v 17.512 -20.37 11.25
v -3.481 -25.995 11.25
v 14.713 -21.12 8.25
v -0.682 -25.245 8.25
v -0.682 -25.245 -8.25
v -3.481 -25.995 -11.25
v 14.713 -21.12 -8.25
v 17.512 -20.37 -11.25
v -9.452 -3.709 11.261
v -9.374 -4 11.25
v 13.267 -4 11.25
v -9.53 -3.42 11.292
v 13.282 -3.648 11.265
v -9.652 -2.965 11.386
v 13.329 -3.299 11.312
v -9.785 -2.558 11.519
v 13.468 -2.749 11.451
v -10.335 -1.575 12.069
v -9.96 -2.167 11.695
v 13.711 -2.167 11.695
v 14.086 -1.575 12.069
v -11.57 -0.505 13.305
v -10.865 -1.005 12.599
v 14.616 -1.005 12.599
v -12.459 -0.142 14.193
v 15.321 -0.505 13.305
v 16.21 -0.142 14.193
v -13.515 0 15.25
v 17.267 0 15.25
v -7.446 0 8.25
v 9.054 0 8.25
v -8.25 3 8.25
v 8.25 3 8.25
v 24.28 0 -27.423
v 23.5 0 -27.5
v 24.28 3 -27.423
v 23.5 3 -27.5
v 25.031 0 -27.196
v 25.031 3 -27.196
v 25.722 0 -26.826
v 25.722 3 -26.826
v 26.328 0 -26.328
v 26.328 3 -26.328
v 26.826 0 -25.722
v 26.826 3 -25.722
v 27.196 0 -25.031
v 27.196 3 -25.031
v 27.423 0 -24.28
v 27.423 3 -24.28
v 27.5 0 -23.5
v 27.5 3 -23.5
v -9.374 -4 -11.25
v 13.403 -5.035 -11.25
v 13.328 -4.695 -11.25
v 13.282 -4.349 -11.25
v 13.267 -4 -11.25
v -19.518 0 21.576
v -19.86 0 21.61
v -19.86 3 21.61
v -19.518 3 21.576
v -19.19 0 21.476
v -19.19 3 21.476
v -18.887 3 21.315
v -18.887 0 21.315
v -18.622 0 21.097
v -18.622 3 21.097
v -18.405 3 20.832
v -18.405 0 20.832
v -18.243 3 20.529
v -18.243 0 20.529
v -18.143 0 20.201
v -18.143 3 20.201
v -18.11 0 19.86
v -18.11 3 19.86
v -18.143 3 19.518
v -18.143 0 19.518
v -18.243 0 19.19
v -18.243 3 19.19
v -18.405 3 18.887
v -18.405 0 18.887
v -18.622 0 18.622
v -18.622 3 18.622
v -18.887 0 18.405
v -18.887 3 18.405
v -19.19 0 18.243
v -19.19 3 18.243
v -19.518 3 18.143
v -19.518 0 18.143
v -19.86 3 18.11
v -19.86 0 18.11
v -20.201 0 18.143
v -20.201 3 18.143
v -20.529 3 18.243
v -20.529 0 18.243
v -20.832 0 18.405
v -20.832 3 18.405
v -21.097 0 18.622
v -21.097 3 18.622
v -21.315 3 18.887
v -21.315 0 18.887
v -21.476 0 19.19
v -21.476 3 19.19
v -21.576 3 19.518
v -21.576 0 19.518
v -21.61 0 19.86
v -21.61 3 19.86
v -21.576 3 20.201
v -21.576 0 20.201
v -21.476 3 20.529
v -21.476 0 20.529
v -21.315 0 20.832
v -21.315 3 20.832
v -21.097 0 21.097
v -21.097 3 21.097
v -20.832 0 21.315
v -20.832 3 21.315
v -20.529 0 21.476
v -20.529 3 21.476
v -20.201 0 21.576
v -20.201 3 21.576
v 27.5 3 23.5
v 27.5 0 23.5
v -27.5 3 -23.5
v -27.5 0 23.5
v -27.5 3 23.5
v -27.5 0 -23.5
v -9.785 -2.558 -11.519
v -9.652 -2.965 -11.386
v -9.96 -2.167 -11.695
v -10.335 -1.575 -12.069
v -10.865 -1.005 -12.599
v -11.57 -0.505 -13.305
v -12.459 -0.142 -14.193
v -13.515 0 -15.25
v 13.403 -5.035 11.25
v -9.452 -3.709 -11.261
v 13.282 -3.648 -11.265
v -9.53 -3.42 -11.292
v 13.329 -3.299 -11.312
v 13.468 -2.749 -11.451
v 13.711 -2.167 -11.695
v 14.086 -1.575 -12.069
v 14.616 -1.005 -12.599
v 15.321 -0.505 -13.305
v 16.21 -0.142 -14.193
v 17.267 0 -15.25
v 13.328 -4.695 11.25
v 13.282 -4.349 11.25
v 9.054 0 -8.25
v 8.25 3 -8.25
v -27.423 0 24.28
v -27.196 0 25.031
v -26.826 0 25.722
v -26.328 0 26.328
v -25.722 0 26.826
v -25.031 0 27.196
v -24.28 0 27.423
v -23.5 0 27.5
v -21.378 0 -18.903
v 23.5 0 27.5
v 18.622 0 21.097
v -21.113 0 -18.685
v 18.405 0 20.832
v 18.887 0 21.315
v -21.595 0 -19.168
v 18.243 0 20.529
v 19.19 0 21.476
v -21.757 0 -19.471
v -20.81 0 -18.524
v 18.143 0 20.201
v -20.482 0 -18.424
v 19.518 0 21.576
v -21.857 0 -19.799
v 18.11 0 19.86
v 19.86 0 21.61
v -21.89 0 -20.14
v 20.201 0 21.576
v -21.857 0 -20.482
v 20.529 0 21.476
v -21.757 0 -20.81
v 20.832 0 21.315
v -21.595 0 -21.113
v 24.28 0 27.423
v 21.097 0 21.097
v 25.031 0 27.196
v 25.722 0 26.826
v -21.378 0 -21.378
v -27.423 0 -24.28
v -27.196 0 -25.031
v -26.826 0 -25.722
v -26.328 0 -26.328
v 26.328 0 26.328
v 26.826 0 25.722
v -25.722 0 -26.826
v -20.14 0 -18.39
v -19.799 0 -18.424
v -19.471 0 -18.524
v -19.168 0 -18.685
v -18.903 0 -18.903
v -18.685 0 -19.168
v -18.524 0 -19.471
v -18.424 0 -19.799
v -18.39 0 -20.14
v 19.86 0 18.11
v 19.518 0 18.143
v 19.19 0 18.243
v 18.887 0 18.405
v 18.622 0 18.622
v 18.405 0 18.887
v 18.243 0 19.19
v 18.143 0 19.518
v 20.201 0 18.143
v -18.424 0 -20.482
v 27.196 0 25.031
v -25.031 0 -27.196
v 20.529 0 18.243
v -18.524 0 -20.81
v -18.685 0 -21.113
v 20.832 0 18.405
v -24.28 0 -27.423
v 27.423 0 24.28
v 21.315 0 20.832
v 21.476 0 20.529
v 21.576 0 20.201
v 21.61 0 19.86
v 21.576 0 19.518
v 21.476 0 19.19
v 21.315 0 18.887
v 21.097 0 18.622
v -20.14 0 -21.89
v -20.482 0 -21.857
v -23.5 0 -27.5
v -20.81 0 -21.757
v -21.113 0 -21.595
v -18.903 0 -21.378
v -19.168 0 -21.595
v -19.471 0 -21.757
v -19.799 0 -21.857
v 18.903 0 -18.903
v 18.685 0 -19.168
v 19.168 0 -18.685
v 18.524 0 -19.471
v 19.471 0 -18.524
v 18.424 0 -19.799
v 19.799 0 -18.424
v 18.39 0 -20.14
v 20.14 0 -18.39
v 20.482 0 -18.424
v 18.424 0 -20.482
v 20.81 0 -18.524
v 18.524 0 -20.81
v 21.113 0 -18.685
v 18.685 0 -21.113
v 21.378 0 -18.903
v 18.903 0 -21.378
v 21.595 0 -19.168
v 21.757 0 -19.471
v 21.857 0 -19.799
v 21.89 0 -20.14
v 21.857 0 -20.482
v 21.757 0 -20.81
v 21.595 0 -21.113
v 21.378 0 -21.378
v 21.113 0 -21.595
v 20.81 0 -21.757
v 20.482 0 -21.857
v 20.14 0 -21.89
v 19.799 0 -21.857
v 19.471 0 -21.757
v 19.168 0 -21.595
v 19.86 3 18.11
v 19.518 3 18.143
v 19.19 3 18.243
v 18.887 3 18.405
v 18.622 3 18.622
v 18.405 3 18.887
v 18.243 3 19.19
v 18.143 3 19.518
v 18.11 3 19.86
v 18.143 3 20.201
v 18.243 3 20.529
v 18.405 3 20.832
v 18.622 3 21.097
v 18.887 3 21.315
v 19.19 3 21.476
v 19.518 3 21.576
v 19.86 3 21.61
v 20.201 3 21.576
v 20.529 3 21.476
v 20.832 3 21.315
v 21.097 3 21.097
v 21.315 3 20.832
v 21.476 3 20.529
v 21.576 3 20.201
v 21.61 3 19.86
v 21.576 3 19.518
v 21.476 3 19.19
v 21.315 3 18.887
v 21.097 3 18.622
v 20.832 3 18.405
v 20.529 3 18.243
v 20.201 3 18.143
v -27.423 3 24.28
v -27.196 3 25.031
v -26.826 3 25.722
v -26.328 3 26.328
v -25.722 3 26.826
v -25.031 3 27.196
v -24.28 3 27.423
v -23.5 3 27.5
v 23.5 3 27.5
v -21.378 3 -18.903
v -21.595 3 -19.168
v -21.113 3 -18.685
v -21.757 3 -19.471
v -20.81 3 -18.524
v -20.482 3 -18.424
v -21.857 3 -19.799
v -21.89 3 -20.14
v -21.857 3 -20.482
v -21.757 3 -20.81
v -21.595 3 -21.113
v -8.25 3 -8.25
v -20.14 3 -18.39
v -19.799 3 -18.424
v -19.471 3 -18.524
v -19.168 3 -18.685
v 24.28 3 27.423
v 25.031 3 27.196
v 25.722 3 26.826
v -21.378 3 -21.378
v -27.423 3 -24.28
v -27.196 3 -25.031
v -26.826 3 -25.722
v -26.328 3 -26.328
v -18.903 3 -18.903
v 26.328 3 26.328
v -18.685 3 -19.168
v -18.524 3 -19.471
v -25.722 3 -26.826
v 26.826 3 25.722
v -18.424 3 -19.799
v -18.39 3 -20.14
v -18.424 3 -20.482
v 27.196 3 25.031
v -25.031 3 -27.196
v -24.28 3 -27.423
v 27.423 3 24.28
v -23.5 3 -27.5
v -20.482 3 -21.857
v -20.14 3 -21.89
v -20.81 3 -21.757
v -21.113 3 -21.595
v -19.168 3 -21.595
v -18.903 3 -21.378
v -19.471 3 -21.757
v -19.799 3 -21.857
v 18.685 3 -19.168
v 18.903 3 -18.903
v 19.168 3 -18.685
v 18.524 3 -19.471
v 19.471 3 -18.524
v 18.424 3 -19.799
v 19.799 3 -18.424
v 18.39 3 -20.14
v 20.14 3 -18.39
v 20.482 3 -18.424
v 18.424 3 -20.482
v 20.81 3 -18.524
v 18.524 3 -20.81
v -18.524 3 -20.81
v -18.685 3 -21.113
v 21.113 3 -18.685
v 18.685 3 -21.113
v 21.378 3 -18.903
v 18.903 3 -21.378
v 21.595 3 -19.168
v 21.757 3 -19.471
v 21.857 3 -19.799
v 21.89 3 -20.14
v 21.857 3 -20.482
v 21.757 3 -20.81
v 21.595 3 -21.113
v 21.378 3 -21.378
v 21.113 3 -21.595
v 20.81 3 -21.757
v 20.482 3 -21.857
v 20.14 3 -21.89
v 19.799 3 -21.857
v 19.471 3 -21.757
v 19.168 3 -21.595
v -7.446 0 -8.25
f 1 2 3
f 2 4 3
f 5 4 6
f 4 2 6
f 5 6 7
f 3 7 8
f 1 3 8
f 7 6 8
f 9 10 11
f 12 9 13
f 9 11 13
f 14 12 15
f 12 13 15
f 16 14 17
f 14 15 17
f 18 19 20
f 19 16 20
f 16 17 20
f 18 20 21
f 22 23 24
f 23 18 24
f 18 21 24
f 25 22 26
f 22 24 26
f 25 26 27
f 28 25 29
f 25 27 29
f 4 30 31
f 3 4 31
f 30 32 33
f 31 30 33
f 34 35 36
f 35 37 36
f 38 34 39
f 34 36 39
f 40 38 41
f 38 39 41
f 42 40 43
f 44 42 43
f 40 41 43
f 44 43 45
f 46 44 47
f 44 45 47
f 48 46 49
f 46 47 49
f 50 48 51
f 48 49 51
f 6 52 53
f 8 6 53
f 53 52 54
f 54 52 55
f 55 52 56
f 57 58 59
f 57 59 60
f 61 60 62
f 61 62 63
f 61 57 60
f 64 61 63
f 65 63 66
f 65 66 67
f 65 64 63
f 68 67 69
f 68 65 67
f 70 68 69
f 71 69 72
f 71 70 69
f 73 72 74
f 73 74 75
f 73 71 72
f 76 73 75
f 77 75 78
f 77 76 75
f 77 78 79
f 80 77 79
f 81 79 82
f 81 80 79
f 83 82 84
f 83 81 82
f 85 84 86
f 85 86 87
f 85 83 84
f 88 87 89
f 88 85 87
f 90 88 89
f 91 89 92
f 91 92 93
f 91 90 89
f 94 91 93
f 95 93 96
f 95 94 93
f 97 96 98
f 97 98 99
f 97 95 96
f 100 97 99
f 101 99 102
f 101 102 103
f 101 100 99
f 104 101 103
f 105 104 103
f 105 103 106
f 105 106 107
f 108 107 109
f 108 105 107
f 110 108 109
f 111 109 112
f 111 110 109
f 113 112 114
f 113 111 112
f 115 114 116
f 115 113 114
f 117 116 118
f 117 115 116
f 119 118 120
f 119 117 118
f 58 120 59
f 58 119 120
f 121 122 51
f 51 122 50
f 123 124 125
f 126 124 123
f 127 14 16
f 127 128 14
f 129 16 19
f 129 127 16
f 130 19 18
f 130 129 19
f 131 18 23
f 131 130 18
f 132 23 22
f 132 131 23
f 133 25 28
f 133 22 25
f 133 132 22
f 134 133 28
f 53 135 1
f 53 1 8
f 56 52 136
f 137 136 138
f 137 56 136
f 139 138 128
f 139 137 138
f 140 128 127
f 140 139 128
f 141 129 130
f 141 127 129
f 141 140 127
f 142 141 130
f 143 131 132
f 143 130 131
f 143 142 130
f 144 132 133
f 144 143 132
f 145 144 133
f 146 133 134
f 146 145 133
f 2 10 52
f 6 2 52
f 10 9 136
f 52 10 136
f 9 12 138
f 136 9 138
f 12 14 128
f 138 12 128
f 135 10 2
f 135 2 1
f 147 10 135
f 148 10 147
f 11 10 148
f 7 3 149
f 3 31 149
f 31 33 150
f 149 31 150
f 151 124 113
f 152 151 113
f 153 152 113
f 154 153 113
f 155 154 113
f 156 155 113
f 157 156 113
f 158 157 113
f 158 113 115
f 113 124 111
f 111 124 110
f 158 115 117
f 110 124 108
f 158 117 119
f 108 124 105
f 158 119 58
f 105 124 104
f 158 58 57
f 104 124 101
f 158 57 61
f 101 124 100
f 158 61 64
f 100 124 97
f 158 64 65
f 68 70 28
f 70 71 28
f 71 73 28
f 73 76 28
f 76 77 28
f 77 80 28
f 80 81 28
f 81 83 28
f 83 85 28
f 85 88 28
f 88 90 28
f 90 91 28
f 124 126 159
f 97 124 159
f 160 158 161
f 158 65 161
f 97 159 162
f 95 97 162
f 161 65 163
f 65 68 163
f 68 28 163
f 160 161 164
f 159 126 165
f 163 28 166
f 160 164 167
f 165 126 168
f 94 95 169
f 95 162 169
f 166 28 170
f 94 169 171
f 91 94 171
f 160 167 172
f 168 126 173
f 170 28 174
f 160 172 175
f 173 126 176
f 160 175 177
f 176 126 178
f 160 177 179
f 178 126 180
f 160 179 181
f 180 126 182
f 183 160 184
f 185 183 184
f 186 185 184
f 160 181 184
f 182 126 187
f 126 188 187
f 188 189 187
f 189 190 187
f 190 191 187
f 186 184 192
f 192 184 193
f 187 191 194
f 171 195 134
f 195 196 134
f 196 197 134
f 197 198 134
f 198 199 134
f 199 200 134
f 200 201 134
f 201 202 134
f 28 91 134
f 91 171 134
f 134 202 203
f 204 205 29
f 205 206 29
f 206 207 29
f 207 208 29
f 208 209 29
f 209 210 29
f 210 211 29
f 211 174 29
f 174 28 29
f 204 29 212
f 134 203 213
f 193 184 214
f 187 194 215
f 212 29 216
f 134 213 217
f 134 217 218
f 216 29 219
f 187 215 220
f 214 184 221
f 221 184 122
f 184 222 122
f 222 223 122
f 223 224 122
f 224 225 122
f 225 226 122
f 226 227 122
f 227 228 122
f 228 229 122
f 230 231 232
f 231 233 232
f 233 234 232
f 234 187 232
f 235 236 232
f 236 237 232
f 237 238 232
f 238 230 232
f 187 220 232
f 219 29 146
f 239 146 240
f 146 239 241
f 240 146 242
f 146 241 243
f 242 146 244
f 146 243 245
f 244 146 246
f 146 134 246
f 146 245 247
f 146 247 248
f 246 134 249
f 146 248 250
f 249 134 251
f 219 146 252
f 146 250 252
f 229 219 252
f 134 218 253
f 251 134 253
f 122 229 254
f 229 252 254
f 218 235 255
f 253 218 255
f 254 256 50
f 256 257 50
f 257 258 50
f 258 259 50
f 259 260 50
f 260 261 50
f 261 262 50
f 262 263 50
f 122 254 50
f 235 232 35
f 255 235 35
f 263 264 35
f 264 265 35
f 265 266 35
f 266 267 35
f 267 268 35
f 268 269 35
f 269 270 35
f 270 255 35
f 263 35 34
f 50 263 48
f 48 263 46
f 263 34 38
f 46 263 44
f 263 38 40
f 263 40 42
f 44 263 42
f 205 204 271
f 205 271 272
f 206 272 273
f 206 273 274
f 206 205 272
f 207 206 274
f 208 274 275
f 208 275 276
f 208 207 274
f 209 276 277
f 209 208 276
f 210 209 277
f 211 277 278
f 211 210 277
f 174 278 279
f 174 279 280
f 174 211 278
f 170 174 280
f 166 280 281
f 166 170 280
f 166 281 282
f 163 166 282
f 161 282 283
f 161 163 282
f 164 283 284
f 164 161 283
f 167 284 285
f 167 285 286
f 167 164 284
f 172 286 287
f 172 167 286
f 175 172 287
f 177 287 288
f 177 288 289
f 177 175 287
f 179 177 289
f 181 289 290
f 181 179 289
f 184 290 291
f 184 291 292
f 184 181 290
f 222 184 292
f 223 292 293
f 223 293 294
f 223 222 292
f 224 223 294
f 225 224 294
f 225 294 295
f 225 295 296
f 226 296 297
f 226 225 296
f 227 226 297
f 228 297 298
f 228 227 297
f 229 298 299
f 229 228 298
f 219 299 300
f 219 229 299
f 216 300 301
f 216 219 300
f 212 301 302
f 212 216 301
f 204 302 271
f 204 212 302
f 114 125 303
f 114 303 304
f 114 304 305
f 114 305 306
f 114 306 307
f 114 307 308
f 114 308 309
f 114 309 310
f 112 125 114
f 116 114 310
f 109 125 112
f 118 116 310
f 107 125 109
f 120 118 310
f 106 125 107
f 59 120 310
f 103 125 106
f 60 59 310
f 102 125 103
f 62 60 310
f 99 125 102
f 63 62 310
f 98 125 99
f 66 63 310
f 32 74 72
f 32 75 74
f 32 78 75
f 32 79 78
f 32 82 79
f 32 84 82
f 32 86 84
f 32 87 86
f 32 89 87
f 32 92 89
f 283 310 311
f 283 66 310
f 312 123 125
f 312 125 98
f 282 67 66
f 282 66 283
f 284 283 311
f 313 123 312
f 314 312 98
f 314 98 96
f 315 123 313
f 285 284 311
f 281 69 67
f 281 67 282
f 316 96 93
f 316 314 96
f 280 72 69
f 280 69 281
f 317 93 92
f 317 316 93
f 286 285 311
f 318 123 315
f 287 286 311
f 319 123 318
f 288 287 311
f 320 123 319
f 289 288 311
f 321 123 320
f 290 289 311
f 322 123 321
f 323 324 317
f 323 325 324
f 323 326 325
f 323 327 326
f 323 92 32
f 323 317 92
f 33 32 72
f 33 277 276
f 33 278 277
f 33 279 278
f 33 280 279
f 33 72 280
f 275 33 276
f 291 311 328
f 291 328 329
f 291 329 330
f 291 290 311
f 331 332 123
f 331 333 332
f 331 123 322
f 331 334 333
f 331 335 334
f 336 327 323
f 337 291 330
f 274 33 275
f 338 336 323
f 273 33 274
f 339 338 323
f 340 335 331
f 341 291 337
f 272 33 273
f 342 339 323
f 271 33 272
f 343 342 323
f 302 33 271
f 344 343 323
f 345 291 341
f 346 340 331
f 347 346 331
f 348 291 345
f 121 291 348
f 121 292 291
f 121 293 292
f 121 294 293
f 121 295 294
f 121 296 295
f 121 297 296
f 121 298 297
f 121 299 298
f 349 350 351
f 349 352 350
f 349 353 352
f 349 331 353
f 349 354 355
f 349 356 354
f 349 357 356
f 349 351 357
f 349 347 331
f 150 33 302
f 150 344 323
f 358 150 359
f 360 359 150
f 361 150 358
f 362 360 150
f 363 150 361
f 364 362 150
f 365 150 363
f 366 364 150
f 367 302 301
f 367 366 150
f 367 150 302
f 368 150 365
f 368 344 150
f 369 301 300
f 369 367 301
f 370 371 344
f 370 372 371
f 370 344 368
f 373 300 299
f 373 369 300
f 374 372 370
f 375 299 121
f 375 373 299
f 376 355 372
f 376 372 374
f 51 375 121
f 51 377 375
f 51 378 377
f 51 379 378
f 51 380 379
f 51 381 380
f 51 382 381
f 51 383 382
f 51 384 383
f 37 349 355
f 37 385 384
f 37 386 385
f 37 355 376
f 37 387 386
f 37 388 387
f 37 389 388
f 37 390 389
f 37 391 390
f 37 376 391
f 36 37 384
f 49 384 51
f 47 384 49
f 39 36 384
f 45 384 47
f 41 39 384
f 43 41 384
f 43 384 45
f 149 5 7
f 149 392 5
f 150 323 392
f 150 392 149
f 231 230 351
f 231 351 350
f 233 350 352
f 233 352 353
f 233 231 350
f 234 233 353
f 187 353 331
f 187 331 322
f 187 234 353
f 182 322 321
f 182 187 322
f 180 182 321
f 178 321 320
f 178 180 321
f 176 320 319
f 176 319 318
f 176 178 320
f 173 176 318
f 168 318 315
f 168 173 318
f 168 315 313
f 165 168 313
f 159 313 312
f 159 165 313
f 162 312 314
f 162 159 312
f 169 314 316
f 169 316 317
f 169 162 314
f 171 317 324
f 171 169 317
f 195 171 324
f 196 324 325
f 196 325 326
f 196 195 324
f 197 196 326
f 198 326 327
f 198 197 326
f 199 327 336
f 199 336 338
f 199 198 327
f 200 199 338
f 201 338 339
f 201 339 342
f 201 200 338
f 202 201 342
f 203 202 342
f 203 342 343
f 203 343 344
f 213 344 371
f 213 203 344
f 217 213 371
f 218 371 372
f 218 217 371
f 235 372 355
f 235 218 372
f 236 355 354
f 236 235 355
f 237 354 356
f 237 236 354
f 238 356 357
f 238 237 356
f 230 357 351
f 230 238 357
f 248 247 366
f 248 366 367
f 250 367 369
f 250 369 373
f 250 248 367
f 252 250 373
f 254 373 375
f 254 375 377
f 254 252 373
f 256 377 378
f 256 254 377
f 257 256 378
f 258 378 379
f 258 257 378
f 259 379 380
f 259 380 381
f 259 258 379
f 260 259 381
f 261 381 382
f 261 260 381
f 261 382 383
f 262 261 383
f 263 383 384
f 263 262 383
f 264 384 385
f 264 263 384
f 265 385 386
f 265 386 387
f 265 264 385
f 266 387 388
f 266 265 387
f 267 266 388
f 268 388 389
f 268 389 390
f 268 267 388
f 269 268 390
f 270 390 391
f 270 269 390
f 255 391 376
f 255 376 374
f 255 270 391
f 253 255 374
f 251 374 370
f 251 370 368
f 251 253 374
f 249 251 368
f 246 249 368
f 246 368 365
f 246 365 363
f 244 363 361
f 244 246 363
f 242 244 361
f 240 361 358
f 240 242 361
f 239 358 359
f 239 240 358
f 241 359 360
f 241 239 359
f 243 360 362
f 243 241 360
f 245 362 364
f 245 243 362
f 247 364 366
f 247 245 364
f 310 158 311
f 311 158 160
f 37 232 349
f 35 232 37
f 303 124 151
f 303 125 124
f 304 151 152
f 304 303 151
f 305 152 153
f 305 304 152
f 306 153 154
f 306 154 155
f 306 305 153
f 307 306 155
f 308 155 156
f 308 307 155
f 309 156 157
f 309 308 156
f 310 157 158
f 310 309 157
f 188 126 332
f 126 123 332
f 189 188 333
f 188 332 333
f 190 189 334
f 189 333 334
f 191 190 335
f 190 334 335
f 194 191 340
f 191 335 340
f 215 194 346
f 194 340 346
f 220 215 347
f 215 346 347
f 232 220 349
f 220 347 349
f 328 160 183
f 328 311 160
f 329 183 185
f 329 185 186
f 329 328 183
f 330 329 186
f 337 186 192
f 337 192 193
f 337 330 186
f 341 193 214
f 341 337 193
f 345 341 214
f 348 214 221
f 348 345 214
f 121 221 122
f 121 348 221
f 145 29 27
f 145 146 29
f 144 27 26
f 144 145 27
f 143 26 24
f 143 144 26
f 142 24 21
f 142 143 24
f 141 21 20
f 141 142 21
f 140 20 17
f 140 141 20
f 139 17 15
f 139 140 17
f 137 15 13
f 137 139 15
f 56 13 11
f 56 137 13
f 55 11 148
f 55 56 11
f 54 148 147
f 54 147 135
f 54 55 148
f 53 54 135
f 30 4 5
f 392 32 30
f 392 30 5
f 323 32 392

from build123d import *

# Parameters (mm, degrees)
SKETCH1_W                       = 55
SKETCH1_H                       = 55
SKETCH1_R                       = 1.75
BOSS_EXTRUDE1_DEPTH             = 3
BOSS_EXTRUDE3_REACH             = 67.033
SKETCH7_W                       = 21.733331091
SKETCH7_H                       = 22.5
SKETCH7_W_2                     = 15.937776134
SKETCH7_H_2                     = 16.5
BOSS_EXTRUDE3_DIRECTION_2_DEPTH = 11
SKETCH8_W                       = 15.937776134
SKETCH8_H                       = 16.5
CUT_EXTRUDE2_DEPTH              = 30
FILLET3_R                       = 4


with BuildPart() as part:
    # Sketch1 → Boss-Extrude1 (new body)
    with BuildSketch(Plane(origin=(0, 0, 0), x_dir=(1, 0, 0), z_dir=(0, 1, 0))):
        Rectangle(SKETCH1_W, SKETCH1_H)
        with Locations(Location((20.140368527, 20.140368527, 0), (0, 0, 270))):
            Circle(SKETCH1_R, mode=Mode.SUBTRACT)
        with Locations(Location((-19.859631473, -19.859631473, 0), (0, 0, 270))):
            Circle(SKETCH1_R, mode=Mode.SUBTRACT)
        with Locations(Location((-20.140368527, 20.140368527, 0), (0, 0, 90))):
            Circle(SKETCH1_R, mode=Mode.SUBTRACT)
        with Locations(Location((19.859631473, -19.859631473, 0), (0, 0, 90))):
            Circle(SKETCH1_R, mode=Mode.SUBTRACT)
    extrude(amount=BOSS_EXTRUDE1_DEPTH)

    # Boss-Extrude3: up to this plane
    boss_extrude3_end = Plane(origin=(0, 0, 0), z_dir=(0, 1, 0))
    # Sketch7 → Boss-Extrude3 (add, up to the surface)
    with BuildSketch(Plane(origin=(3.41851723, -12.758079989, 27.5), x_dir=(0.9659258262890681, 0.25881904510252174, 0), z_dir=(-0.25881904510252174, 0.9659258262890681, 0)), mode=Mode.PRIVATE) as boss_extrude3_sk1:
        with Locations((0.776457136, 27.5)):
            Rectangle(SKETCH7_W, SKETCH7_H)
        with Locations((0.776457135, 27.5)):
            Rectangle(SKETCH7_W_2, SKETCH7_H_2, mode=Mode.SUBTRACT)
    boss_extrude3_tool1 = split(extrude(boss_extrude3_sk1.sketch, amount=BOSS_EXTRUDE3_REACH, mode=Mode.PRIVATE), bisect_by=boss_extrude3_end, keep=Keep.BOTH, mode=Mode.PRIVATE)
    add(boss_extrude3_tool1.solids().sort_by_distance((4.168517, -12.557118, 10.937176))[0])

    # Sketch7 → Boss-Extrude3 direction 2 (add)
    with BuildSketch(Plane(origin=(3.41851723, -12.758079989, 27.5), x_dir=(0.9659258262890681, 0.25881904510252174, 0), z_dir=(-0.25881904510252174, 0.9659258262890681, 0))):
        with Locations((0.776457136, 27.5)):
            Rectangle(SKETCH7_W, SKETCH7_H)
        with Locations((0.776457135, 27.5)):
            Rectangle(SKETCH7_W_2, SKETCH7_H_2, mode=Mode.SUBTRACT)
    extrude(amount=-BOSS_EXTRUDE3_DIRECTION_2_DEPTH)

    # Sketch8 → Cut-Extrude2 (cut)
    with BuildSketch(Plane(origin=(6.265526726, -23.383264078, 0), x_dir=(0.9659258262890681, 0.2588190451025216, 0), z_dir=(0.2588190451025216, -0.9659258262890681, 0))):
        with Locations((0.776457135, 0)):
            Rectangle(SKETCH8_W, SKETCH8_H)
    extrude(amount=-CUT_EXTRUDE2_DEPTH, mode=Mode.SUBTRACT)

    # Fillet3
    fillet3_edges = [part.edges().sort_by_distance(p)[0] for p in [
        (0.803847577, 0, 11.25),
        (12.053847577, 0, 0),
        (0.803847577, 0, -11.25),
        (-10.446152423, 0, 0),
        (27.5, 1.5, 27.5),
        (-27.5, 1.5, 27.5),
        (-27.5, 1.5, -27.5),
        (27.5, 1.5, -27.5),
    ]]
    fillet(fillet3_edges, radius=FILLET3_R)


solid = part.part
